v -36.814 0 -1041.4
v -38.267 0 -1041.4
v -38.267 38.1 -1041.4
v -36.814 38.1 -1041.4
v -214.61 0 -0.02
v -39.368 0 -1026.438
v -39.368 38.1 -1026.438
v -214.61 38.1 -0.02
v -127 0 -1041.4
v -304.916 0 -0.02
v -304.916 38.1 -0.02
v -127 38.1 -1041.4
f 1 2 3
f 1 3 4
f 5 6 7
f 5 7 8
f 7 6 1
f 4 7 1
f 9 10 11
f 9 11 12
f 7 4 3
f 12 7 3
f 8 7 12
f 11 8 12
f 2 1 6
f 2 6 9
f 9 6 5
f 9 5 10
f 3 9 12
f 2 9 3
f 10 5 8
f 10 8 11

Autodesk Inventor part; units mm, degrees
ref_plane "YZ Plane" through (0, 0, 0) normal (1, 0, 0) x (0, 1, 0)
ref_plane "XZ Plane" through (0, 0, 0) normal (0, 1, 0) x (-1, 0, 0)
ref_plane "XY Plane" through (0, 0, 0) normal (0, 0, 1) x (1, 0, 0)
sketch "Sketch1" plane through (0, 0, 0) normal (0, 1, 0) x (-1, 0, 0)
  line L0 (214.6102, -0.0199) -> (304.9164, -0.0199)
  line L1 (304.9164, -0.0199) -> (214.6102, -0.0199)
  line L2 (304.9164, -0.0199) -> (127, -1041.4)
  line L3 (127, -1041.4) -> (38.2671, -1041.4)
  line L4 (39.368, -1026.4384) -> (214.6102, -0.0199)
  line L5 (38.2671, -1041.4) -> (36.8136, -1041.4)
  line L6 (39.368, -1026.4384) -> (36.8136, -1041.4)
  point P0 (0, 0)
extrude "Extrusion1" add sketch "Sketch1" along normal blind 38.1
properties part number "S_2x4x48.76"
